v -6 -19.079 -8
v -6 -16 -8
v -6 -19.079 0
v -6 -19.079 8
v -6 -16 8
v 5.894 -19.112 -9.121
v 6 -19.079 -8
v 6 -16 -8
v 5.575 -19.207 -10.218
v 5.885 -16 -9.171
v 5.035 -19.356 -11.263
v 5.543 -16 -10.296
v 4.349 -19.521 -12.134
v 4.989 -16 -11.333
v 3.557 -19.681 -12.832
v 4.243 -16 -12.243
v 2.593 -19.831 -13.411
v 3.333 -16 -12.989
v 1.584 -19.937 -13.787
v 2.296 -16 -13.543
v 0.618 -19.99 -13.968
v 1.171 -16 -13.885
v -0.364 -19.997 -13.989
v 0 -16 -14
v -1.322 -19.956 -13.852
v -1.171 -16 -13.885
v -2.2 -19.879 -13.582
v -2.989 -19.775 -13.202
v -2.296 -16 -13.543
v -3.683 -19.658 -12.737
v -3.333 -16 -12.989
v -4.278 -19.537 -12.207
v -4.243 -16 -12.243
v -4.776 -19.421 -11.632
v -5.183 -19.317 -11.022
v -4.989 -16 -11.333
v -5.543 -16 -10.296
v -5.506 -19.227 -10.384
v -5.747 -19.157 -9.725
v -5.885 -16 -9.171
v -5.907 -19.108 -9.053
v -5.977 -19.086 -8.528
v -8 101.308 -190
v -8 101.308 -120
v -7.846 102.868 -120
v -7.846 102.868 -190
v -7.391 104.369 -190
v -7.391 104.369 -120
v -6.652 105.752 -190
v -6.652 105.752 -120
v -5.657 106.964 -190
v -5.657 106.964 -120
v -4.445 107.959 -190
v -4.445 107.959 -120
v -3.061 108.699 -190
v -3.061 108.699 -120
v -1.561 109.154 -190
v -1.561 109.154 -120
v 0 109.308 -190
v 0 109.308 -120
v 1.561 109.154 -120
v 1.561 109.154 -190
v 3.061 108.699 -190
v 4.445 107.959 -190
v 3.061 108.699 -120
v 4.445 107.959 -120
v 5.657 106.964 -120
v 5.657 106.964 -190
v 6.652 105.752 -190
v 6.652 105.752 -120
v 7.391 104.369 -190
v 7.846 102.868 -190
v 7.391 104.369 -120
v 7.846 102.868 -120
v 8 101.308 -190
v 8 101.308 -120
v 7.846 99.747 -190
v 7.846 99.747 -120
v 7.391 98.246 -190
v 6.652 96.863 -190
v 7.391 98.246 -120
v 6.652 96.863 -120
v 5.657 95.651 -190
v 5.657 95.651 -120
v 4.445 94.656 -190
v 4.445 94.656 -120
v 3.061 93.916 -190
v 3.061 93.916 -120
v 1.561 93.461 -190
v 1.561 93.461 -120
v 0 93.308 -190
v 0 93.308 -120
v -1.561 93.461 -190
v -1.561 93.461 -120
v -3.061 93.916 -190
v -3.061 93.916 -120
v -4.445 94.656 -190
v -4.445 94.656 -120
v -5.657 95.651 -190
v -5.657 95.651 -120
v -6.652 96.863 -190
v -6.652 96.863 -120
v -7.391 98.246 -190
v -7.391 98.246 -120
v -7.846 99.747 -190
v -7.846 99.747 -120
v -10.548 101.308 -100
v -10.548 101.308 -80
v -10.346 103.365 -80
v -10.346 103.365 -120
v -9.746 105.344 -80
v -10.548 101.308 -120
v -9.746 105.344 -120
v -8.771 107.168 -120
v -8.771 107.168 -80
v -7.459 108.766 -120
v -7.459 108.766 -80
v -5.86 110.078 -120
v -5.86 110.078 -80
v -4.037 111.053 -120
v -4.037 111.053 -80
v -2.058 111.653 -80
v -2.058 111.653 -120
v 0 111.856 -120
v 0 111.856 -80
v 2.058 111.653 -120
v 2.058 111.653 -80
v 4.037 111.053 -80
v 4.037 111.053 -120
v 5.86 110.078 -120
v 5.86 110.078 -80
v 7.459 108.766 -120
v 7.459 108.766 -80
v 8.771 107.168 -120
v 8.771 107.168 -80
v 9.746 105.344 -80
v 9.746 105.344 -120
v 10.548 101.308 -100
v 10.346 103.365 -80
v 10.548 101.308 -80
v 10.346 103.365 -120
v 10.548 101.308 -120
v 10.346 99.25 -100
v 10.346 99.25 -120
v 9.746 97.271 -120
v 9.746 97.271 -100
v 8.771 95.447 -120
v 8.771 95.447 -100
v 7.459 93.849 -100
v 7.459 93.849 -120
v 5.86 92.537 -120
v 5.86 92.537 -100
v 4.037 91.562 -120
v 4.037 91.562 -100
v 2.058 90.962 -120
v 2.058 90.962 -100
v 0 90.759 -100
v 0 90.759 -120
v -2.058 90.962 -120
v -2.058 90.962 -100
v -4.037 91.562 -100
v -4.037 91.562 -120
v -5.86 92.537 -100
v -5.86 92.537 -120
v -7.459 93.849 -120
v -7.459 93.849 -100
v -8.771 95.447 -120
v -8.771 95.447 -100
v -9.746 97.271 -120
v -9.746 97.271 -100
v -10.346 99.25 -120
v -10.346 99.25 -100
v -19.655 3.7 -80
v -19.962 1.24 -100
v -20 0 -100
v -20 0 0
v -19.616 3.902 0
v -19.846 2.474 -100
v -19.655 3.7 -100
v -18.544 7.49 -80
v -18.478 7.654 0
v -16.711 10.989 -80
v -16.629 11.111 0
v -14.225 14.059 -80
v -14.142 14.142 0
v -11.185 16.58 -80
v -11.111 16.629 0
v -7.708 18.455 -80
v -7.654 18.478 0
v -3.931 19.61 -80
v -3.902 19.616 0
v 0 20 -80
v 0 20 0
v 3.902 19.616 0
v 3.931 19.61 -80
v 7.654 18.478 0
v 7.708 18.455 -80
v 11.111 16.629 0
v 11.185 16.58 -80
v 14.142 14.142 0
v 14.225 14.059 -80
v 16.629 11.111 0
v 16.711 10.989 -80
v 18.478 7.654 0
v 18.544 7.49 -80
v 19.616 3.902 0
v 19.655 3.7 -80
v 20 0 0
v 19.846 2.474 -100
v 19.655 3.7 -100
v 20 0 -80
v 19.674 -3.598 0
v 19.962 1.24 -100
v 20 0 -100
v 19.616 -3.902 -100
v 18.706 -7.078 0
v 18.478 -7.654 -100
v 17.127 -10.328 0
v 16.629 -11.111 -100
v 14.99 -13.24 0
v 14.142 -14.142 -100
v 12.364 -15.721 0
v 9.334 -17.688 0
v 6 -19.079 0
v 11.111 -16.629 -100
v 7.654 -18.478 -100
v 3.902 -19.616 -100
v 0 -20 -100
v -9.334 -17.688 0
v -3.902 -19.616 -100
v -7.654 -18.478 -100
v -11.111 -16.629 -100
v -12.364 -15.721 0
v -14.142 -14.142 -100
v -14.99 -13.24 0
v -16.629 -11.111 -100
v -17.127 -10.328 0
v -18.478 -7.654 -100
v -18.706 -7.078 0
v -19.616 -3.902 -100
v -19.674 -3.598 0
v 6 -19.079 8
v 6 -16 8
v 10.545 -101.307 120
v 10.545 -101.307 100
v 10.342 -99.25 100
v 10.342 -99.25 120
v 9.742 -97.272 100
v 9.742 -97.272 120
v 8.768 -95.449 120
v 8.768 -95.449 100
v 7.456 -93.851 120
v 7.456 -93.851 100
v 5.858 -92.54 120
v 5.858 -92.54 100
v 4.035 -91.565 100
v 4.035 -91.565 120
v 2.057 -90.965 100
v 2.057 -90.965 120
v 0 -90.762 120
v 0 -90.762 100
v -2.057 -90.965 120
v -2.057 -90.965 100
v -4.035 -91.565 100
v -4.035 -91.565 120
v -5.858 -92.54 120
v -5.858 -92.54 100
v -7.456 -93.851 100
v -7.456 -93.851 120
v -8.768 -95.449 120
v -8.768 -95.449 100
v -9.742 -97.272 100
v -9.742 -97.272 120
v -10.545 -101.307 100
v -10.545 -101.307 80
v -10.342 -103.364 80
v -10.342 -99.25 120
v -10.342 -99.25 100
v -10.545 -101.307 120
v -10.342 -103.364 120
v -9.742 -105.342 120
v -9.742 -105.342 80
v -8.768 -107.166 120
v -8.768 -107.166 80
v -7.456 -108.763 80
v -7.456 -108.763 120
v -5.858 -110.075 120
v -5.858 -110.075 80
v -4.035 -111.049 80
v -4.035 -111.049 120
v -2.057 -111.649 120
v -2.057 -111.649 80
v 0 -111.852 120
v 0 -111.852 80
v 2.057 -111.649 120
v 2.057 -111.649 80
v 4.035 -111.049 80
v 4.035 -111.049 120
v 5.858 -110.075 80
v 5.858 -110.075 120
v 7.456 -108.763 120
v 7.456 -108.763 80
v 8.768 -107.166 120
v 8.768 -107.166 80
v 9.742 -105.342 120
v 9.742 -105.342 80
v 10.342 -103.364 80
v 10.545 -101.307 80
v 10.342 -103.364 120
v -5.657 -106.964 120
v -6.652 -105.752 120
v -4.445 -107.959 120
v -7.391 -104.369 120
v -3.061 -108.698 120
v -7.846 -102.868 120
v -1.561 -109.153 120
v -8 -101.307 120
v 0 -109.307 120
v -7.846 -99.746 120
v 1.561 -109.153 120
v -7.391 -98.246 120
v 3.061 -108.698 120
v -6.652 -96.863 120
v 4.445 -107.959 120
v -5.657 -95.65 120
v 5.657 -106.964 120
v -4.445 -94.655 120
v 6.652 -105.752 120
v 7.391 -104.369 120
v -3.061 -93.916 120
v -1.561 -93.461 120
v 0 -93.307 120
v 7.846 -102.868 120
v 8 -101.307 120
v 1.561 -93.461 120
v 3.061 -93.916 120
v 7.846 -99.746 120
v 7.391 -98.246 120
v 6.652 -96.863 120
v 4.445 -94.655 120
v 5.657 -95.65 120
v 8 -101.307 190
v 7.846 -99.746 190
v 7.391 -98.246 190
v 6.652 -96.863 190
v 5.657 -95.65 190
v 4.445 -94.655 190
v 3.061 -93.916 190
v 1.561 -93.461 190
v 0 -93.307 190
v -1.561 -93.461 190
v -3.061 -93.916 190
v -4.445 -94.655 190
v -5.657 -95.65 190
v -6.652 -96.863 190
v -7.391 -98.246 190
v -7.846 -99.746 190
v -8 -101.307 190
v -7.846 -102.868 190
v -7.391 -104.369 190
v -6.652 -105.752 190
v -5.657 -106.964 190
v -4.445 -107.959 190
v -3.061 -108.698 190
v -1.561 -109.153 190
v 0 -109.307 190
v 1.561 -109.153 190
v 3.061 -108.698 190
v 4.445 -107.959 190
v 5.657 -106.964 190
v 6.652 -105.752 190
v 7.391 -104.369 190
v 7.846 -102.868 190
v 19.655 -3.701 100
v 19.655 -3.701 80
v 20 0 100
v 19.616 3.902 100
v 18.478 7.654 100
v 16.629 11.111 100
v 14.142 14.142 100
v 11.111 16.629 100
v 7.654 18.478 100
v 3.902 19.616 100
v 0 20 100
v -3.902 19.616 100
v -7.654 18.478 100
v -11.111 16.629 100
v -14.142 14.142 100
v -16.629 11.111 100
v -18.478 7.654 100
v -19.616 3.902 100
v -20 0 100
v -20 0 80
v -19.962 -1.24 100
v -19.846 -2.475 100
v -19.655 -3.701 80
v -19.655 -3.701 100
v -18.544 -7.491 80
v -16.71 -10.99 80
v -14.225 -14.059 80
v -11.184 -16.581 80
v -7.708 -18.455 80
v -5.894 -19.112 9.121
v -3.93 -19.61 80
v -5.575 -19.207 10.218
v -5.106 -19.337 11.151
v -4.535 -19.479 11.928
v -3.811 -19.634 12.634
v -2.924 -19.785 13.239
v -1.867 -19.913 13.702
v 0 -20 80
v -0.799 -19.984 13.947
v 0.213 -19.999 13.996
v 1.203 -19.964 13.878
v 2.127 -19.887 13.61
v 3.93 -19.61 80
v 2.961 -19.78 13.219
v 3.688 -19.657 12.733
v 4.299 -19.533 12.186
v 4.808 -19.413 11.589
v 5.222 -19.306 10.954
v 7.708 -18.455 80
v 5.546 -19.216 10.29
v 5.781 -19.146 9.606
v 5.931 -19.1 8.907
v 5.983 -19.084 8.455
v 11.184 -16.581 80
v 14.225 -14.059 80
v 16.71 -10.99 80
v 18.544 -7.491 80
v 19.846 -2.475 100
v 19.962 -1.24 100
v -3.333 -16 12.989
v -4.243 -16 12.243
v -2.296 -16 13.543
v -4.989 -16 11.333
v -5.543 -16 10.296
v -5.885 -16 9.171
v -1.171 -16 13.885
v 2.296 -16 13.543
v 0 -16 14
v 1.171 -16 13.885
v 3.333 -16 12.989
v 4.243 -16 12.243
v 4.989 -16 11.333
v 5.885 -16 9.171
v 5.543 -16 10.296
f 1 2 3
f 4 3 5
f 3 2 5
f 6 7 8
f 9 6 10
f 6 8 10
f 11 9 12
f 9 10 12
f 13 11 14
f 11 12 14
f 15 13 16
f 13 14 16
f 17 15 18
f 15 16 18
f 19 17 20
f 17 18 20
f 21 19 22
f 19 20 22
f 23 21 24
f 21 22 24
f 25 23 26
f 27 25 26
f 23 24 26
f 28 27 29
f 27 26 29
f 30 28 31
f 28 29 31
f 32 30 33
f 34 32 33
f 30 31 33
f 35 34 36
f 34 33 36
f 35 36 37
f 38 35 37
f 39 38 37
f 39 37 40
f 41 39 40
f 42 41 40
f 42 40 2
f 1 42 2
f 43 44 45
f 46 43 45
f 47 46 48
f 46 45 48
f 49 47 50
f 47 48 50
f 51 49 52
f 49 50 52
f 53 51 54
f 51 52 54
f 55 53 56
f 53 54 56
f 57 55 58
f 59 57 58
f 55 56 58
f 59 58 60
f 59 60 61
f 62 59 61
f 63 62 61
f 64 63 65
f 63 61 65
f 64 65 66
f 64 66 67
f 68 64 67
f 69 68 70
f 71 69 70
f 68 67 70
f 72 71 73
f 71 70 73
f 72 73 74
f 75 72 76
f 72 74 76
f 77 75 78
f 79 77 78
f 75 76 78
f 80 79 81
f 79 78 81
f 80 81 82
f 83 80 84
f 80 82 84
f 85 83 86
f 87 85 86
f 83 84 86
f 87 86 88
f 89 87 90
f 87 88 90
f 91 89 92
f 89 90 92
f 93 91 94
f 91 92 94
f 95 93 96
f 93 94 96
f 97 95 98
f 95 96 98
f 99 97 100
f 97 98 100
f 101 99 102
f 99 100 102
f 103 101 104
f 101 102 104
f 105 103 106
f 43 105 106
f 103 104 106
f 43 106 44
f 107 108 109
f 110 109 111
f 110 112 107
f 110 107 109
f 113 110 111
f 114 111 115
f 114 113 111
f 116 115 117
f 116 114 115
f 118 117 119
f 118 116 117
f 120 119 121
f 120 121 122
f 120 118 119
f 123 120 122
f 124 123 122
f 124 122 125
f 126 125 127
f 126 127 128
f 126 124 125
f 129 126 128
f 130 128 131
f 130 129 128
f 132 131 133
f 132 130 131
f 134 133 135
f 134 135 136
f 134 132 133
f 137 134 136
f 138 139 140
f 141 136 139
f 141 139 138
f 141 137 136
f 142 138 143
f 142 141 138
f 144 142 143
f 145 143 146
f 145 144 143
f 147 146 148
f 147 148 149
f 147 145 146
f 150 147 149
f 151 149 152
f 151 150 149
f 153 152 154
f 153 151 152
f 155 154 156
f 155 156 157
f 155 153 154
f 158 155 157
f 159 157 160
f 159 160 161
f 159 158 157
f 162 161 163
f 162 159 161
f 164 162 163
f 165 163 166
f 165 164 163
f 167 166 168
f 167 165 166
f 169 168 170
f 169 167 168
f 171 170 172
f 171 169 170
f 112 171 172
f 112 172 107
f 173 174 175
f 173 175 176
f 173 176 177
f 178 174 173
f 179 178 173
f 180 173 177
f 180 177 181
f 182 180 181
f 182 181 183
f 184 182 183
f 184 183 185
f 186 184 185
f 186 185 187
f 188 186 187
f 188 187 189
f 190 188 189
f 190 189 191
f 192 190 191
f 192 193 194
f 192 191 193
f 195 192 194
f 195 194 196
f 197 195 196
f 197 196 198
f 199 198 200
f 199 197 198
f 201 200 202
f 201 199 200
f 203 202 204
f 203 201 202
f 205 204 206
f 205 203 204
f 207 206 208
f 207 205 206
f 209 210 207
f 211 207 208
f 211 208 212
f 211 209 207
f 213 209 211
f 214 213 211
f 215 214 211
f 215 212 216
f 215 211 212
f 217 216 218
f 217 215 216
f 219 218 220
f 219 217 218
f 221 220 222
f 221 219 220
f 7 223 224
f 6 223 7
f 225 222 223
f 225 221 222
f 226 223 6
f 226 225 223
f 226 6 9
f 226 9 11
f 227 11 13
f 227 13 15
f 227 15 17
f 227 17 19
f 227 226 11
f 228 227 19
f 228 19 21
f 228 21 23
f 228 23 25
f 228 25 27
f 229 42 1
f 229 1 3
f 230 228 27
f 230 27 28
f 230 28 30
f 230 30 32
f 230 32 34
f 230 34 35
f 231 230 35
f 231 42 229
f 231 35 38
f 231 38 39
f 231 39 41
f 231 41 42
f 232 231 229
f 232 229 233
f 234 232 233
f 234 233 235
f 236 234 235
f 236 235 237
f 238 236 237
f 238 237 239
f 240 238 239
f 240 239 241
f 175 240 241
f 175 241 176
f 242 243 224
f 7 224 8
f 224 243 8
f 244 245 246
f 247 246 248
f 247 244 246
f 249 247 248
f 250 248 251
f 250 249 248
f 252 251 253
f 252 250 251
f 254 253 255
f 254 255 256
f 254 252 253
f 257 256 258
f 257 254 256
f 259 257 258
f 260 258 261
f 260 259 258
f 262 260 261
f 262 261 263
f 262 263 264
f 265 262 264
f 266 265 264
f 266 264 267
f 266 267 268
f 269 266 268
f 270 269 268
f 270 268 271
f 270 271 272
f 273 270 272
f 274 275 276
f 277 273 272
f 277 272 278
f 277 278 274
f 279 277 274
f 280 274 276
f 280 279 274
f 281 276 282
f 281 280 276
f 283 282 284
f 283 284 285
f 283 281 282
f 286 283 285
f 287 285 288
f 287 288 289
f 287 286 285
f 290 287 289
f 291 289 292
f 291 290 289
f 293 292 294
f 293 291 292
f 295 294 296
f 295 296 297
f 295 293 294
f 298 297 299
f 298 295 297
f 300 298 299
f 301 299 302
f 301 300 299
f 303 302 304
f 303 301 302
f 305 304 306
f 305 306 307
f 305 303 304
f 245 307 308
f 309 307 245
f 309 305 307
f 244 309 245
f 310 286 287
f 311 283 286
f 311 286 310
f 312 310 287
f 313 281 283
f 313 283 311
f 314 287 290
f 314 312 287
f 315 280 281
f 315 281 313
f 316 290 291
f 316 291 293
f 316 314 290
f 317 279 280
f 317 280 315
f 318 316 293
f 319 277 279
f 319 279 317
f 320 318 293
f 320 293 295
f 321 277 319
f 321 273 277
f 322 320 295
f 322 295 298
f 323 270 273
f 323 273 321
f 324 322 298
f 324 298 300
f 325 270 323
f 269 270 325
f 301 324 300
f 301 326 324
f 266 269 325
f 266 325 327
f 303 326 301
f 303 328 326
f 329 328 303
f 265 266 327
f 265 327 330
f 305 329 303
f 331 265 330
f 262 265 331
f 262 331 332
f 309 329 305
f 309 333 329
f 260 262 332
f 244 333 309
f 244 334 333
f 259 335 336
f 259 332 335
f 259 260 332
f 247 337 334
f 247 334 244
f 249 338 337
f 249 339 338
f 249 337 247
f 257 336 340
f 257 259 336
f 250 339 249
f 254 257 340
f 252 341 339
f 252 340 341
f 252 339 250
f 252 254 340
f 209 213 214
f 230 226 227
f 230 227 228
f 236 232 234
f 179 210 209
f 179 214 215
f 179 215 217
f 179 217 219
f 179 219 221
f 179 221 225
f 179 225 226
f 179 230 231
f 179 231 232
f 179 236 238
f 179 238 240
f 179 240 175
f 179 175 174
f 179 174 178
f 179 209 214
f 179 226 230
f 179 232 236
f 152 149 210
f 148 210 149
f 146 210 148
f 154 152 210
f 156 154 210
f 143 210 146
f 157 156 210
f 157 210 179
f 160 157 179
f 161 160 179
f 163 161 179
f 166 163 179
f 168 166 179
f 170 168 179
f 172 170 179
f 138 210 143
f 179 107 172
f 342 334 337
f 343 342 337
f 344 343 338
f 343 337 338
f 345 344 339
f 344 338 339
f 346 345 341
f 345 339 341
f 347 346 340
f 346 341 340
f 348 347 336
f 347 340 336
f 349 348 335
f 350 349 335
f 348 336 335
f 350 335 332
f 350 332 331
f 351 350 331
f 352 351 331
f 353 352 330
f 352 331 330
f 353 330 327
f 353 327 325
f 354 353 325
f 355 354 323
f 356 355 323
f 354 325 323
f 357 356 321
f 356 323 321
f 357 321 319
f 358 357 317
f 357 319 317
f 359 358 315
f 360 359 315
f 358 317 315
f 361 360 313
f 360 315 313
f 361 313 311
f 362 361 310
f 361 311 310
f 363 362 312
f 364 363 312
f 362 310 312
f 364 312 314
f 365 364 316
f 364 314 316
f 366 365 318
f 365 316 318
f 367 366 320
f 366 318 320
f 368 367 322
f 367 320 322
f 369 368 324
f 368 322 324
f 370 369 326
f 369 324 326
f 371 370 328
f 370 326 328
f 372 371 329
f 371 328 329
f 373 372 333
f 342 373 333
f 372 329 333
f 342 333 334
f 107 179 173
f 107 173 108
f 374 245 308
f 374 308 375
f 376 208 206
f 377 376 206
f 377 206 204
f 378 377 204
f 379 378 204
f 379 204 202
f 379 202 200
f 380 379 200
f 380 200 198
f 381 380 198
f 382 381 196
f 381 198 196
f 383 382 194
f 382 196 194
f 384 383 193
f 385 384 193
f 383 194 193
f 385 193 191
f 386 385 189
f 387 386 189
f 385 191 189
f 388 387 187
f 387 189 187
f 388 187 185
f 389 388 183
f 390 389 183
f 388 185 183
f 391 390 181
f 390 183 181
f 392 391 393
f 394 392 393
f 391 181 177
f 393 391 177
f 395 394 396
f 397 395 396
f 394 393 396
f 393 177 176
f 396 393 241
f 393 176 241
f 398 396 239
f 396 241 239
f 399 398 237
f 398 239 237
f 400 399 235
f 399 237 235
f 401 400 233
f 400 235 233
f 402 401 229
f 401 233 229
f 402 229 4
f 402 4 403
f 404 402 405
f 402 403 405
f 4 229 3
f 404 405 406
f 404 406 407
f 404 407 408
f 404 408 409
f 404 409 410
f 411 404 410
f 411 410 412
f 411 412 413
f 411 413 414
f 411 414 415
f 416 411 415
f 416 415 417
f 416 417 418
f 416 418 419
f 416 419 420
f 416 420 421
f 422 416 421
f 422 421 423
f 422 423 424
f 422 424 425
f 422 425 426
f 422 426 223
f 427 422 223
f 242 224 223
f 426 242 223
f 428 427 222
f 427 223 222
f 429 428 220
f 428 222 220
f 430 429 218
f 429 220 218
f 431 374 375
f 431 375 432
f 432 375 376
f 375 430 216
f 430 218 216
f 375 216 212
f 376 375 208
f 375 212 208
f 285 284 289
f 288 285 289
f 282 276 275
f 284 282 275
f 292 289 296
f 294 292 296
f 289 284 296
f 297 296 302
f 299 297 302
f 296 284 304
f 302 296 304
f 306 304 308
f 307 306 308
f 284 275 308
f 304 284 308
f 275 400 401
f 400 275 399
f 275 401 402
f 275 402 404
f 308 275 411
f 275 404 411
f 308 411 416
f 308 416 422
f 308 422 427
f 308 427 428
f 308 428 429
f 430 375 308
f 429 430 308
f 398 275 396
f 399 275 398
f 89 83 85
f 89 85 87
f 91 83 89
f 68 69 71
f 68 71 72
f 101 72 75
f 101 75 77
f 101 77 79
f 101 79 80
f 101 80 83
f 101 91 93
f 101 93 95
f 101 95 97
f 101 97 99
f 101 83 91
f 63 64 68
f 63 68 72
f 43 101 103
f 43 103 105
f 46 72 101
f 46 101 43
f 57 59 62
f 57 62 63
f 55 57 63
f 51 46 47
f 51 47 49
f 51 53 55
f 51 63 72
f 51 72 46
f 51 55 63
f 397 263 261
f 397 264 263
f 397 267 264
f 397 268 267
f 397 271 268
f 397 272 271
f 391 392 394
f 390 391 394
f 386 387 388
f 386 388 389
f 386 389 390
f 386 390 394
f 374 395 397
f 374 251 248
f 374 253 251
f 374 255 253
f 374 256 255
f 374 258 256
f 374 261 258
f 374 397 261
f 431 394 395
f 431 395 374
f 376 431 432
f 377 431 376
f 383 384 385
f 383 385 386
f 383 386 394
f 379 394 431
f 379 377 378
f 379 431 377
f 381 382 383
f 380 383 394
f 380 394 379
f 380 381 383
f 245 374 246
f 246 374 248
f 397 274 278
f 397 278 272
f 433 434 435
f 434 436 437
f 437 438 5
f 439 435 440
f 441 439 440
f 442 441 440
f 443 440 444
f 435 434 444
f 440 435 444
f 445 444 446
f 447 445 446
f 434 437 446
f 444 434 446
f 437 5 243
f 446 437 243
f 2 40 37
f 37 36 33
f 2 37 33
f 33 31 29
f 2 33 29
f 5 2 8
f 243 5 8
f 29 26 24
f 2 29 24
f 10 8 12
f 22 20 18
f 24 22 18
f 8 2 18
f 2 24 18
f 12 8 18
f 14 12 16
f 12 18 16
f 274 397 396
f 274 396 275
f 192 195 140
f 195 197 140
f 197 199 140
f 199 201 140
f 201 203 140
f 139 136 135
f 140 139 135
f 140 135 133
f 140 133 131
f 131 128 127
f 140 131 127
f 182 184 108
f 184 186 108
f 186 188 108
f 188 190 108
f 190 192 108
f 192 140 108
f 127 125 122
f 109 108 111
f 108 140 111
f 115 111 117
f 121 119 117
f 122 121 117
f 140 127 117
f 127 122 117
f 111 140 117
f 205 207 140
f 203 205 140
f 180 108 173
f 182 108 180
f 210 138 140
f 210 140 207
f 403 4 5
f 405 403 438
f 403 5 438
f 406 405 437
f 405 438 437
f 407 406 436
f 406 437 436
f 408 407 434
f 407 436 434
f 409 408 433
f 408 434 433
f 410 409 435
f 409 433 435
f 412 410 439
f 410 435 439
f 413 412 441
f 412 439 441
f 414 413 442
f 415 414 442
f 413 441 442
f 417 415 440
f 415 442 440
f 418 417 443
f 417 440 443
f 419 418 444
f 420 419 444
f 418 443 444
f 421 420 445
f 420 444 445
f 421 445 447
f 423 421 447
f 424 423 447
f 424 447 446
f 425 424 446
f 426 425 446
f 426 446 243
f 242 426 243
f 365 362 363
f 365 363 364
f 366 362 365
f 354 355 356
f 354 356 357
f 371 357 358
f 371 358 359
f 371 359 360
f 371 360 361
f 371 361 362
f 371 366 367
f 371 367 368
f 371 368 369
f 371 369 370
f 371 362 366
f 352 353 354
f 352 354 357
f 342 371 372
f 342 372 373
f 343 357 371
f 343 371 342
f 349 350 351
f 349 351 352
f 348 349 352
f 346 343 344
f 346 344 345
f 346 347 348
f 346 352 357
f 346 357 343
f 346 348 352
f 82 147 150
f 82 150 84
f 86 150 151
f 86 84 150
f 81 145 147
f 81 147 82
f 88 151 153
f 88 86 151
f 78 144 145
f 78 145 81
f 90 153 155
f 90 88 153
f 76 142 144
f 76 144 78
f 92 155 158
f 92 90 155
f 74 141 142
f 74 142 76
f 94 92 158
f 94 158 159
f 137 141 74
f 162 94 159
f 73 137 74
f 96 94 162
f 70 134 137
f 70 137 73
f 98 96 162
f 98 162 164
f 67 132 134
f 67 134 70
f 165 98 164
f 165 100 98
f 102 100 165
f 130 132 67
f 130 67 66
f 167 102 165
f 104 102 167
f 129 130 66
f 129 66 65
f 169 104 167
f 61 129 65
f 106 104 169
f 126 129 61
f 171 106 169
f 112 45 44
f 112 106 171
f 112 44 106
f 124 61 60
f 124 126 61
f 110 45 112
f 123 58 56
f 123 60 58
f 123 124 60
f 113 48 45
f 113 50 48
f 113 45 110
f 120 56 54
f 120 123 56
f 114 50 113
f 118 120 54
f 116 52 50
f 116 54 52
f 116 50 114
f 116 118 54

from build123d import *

# Parameters (mm, degrees)
SKETCH_1_R               = 20
EXTRUDE_2_DEPTH          = 100
EXTRUDE_3_DEPTH          = 20
SKETCH_3_R               = 10.544762533
EXTRUDE_4_DEPTH          = 20
SKETCH_4_R               = 8
EXTRUDE_5_DEPTH          = 70
EXTRUDE_START            = 100
SKETCH_5_R               = 20
EXTRUDE_6_DEPTH          = 100
EXTRUDE_8_DEPTH          = 20
SKETCH_7_R               = 10.548482156
EXTRUDE_9_DEPTH          = 20
SKETCH_8_R               = 8
EXTRUDE_10_DEPTH         = 70
CUT_EXTRUDE_1_REACH      = 231.885
CUT_EXTRUDE_1_END_RADIUS = 20


with BuildPart() as part:
    # 草图1 → 凸台-拉伸2 (new body)
    with BuildSketch(Plane.XY):
        Circle(SKETCH_1_R)
    extrude(amount=EXTRUDE_2_DEPTH)

    # 草图2 → 凸台-拉伸3 (add)
    with BuildSketch(Plane.XY.offset(100)):
        Polygon((-20, 0), (-10.544762533, -101.307170503), (10.544762533, -101.307170503), (20, 0), align=None)
    extrude(amount=-EXTRUDE_3_DEPTH)

    # 草图3 → 凸台-拉伸4 (add, symmetric)
    with BuildSketch(Plane.XY.offset(100)):
        with Locations((0, -101.307170503)):
            Circle(SKETCH_3_R)
    extrude(amount=EXTRUDE_4_DEPTH, both=True)

    # 草图4 → 凸台-拉伸5 (add)
    with BuildSketch(Plane.XY.offset(120)):
        with Locations((0, -101.307170503)):
            Circle(SKETCH_4_R)
    extrude(amount=EXTRUDE_5_DEPTH)

    # 草图5 → 凸台-拉伸6 (add)
    with BuildSketch(Plane(origin=(0, 0, 0), x_dir=(-1, 0, 0), z_dir=(0, 0, -1)).offset(EXTRUDE_START)):
        Circle(SKETCH_5_R)
    extrude(amount=-EXTRUDE_6_DEPTH)

    # 草图6 → 凸台-拉伸8 (add)
    with BuildSketch(Plane(origin=(0, 0, -100), x_dir=(-1, 0, 0), z_dir=(0, 0, -1))):
        Polygon((20, 0), (10.548482156, 101.307517591), (-10.548482156, 101.307517591), (-20, 0), align=None)
    extrude(amount=-EXTRUDE_8_DEPTH)

    # 草图7 → 凸台-拉伸9 (add, symmetric)
    with BuildSketch(Plane(origin=(0, 0, -100), x_dir=(-1, 0, 0), z_dir=(0, 0, -1))):
        with Locations((0, 101.307517591)):
            Circle(SKETCH_7_R)
    extrude(amount=EXTRUDE_9_DEPTH, both=True)

    # 草图8 → 凸台-拉伸10 (add)
    with BuildSketch(Plane(origin=(0, 0, -120), x_dir=(-1, 0, 0), z_dir=(0, 0, -1))):
        with Locations((0, 101.307517591)):
            Circle(SKETCH_8_R)
    extrude(amount=EXTRUDE_10_DEPTH)

    # 切除-拉伸1: up to this cylinder (the profile starts inside it)
    cut_extrude_1_end = Plane(origin=(0, 0, 0), z_dir=(0, 0, -1)) * Cylinder(CUT_EXTRUDE_1_END_RADIUS, 504.77, mode=Mode.PRIVATE)
    # 草图9 → 切除-拉伸1 (cut, up to the surface)
    with BuildSketch(Plane(origin=(0, -16, 0), x_dir=(1, 0, 0), z_dir=(0, 1, 0)), mode=Mode.PRIVATE) as cut_extrude_1_sk1:
        with BuildLine():
            Line((6, -8), (6, 8))
            ThreePointArc((6, 8), (0, 14), (-6, 8))
            Line((-6, 8), (-6, -8))
            ThreePointArc((-6, -8), (0, -14), (6, -8))
        make_face()
    cut_extrude_1_tool1 = extrude(cut_extrude_1_sk1.sketch, amount=-CUT_EXTRUDE_1_REACH, mode=Mode.PRIVATE) & cut_extrude_1_end
    add(cut_extrude_1_tool1.solids().sort_by_distance((0, -16, 0))[0], mode=Mode.SUBTRACT)


solid = part.part
